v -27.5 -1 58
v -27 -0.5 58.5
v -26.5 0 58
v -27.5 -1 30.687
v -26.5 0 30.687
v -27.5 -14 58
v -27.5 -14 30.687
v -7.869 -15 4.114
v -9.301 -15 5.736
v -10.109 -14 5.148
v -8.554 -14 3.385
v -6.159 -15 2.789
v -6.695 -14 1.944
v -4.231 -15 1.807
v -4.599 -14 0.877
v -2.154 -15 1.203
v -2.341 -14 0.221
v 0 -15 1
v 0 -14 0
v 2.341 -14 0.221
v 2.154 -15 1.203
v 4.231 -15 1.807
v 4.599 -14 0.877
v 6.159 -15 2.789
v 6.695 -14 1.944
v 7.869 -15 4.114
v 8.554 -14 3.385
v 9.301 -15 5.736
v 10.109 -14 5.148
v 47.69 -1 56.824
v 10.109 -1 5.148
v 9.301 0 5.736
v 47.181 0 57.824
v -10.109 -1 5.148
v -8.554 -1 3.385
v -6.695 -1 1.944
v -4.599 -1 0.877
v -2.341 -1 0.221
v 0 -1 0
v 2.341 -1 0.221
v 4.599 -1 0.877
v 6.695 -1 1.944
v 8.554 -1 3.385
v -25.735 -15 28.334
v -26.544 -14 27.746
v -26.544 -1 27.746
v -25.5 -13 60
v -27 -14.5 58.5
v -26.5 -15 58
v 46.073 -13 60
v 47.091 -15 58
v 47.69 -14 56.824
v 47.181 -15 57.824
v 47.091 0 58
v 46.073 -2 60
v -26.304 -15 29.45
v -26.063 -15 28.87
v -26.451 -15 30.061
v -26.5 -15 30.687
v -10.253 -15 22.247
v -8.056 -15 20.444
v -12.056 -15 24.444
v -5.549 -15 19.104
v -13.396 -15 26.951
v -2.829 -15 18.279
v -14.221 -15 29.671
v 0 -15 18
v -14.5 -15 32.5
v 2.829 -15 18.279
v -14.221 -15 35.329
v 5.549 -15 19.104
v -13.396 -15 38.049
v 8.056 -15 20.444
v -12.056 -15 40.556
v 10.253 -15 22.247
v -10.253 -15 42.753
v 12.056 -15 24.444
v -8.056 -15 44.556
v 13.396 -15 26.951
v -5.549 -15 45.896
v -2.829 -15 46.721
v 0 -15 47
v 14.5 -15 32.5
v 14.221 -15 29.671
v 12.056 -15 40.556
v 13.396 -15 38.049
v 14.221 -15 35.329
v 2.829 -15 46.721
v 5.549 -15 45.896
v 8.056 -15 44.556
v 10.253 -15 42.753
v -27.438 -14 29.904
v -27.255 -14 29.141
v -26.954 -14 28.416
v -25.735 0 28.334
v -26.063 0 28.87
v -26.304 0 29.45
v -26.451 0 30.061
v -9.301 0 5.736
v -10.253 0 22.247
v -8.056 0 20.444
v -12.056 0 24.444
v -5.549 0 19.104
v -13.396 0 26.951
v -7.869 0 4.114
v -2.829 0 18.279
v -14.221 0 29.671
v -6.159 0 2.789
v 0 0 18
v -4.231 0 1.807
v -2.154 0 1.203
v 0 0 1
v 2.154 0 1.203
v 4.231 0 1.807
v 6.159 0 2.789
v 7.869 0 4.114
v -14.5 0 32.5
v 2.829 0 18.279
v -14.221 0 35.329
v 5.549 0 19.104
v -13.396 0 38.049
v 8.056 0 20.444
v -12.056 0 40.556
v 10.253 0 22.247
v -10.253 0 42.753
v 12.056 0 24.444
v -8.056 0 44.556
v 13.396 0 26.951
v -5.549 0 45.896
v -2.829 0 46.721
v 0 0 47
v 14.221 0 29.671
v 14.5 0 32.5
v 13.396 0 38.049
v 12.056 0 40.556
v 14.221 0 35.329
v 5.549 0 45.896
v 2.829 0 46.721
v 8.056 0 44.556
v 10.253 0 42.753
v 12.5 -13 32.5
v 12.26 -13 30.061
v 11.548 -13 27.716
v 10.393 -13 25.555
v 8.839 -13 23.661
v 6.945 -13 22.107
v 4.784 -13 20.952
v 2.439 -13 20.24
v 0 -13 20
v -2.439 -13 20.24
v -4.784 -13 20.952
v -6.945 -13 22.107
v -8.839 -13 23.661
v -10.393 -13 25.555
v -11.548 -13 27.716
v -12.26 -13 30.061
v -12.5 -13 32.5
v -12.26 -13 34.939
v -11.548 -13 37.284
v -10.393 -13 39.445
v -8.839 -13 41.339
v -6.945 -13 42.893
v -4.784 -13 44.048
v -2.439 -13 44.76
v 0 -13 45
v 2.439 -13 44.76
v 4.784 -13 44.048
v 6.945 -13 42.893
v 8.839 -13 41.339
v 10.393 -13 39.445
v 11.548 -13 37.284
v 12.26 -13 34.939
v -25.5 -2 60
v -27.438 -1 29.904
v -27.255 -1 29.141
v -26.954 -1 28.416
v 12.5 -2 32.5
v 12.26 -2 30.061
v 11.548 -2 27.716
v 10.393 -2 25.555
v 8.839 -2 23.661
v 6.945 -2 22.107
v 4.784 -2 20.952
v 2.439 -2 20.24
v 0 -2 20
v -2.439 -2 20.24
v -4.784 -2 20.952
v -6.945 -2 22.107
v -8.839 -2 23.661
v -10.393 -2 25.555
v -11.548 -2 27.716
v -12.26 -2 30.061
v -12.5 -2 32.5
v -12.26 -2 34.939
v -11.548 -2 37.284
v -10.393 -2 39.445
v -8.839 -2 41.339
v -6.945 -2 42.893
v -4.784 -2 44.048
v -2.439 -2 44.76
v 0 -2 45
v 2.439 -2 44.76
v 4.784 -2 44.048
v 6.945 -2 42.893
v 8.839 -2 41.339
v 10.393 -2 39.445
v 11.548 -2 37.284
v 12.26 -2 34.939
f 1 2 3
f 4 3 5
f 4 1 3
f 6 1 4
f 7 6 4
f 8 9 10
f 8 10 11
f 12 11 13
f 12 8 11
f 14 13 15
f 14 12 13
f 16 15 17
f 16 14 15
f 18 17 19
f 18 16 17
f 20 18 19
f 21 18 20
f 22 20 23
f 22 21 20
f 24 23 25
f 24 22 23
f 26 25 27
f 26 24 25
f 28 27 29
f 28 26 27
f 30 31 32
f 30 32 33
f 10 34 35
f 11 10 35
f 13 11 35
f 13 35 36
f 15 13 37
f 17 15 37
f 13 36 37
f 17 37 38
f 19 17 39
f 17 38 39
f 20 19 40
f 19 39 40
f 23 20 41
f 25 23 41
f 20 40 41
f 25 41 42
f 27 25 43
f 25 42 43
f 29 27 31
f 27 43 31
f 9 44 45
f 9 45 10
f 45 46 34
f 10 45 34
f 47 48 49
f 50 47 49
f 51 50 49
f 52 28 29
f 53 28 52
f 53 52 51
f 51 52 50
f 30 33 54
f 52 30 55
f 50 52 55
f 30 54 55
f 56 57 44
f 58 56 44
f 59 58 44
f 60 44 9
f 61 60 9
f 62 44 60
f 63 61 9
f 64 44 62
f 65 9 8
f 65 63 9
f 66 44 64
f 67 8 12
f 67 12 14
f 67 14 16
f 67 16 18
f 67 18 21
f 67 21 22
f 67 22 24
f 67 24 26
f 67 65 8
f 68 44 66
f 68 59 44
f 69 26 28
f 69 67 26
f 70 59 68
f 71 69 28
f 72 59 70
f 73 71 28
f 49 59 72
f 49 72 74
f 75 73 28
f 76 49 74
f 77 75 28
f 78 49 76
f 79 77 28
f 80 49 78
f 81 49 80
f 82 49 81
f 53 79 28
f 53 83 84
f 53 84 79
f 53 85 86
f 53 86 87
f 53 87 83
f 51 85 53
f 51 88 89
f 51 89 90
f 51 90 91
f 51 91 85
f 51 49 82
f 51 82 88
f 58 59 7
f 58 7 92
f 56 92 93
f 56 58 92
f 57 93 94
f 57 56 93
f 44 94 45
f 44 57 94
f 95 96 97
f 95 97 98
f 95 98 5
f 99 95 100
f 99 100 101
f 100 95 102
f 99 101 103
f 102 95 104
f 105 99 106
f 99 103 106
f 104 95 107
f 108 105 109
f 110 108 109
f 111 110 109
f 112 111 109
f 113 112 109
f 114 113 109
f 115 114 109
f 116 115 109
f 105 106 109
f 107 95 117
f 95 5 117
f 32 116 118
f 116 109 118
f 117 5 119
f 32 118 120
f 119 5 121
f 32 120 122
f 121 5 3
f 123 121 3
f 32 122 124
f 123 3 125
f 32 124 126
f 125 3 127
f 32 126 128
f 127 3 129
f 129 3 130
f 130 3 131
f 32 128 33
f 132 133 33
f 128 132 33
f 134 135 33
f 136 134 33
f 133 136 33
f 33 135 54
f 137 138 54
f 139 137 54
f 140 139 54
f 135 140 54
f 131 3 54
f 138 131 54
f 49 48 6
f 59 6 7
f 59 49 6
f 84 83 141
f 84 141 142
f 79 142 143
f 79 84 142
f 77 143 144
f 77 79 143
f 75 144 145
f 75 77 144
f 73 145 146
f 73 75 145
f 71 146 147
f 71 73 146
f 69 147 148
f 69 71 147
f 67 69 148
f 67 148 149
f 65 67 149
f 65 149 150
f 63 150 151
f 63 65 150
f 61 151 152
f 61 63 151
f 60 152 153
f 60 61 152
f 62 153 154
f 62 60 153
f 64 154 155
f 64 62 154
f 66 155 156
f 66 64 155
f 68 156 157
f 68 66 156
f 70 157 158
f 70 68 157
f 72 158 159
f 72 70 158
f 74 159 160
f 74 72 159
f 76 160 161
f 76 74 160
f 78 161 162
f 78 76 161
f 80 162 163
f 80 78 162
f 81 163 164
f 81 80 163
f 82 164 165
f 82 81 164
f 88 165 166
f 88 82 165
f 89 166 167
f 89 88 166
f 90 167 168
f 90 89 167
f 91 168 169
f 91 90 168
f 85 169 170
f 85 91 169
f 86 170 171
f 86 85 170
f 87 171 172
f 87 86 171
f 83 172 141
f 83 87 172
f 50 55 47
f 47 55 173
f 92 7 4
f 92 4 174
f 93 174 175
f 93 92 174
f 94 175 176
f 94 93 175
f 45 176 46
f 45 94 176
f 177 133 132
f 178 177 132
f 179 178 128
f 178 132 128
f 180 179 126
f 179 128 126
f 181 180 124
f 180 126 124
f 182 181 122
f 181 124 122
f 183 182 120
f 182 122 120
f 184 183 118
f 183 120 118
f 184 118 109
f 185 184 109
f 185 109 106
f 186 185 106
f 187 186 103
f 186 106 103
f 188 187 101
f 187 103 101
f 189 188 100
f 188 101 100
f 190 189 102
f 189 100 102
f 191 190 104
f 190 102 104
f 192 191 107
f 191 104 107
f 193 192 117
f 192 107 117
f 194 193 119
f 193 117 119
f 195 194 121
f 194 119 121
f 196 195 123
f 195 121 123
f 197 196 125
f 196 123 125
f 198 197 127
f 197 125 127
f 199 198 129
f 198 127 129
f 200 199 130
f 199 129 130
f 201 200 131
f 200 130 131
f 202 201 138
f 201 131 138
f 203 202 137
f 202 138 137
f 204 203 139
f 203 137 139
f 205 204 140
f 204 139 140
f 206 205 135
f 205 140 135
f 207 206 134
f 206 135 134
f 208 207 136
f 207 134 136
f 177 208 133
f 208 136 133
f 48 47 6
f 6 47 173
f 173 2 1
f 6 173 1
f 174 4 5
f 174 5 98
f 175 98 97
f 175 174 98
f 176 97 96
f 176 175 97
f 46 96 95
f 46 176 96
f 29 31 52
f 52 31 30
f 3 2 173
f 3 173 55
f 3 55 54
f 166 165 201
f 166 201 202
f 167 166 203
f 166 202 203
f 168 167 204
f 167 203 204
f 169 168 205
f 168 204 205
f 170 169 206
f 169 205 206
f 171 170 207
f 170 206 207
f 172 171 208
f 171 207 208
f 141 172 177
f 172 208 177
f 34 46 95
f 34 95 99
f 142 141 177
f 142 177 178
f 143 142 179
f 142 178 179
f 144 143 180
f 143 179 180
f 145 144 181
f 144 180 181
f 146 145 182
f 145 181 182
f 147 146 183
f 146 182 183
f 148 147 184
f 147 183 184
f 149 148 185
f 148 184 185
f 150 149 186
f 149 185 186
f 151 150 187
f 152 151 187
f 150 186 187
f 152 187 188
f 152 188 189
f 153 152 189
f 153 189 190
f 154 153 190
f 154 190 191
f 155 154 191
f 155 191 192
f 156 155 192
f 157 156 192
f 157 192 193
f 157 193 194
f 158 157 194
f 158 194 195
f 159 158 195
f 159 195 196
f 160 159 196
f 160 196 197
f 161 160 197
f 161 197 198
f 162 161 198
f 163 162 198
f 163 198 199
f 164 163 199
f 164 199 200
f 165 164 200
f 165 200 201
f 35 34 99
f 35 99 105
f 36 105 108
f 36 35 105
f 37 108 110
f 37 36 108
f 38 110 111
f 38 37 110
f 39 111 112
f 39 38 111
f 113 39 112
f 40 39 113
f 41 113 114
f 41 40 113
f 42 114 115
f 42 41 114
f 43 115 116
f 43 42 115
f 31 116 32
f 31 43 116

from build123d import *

# Parameters (mm, degrees)
F1_DEPTH    = 15
F2_T1_DEPTH = 34.8219363514
F2_T3_DEPTH = 25.2867319519
F2_T5_DEPTH = 87.7867319519
F3_R        = 5
F4_SIZE     = 1


# Not quite as in the source:
# - a fillet or chamfer that OpenCascade refuses, or shapes differently, is made with other operations: its cross-section is extruded or revolved along the edge and cut away or added


with BuildPart() as f1:
    # F0 (on Front) → F1 (new body)
    with BuildSketch(Plane.XZ):
        with BuildLine():
            Line((50, 60), (0, 60))
            Line((0, 60), (-27.5, 60))
            Line((-27.5, 60), (-27.5, 29.0612040202))
            Line((-27.5, 29.0612040202), (-10.1093475479, 5.1480552127))
            ThreePointArc((-10.1093475479, 5.1480552127), (0, 0), (10.1093475479, 5.1480552127))
            Line((10.1093475479, 5.1480552127), (50, 60))
        make_face()
        with BuildLine():
            ThreePointArc((12.5, 32.5), (-8.8388347648, 23.6611652352), (0, 45))
            ThreePointArc((0, 45), (8.8388347648, 41.3388347648), (12.5, 32.5))
        make_face(mode=Mode.SUBTRACT)
    extrude(amount=F1_DEPTH)

    # F2: chamfer of 2 on 7 edges, made by hand

    # F2_s2 → F2_t1 (cut)
    with BuildSketch(Plane.XZ.offset(-9.9109681757)):
        Polygon((47.69005228, 56.823688834), (46.0725566723, 60), (50, 60), align=None)
    extrude(amount=F2_T1_DEPTH, mode=Mode.SUBTRACT)

    # F2_s4 → F2_t3 (cut)
    with BuildSketch(Plane.XZ.offset(-5.1433659759)):
        Polygon((-25.5, 60), (-27.5, 58), (-27.5, 60), align=None)
    extrude(amount=F2_T3_DEPTH, mode=Mode.SUBTRACT)

    # F2_s6 → F2_t5 (cut)
    with BuildSketch(Plane.YZ.offset(-32.6433659759)):
        Polygon((-2, 60), (0, 58), (0, 60), align=None)
        Polygon((-13, 60), (-15, 58), (-15, 60), align=None)
    extrude(amount=F2_T5_DEPTH, mode=Mode.SUBTRACT)

    # F2_s7 → F2_t8 (revolve, cut)
    with BuildSketch(Plane.XY.offset(32.5)):
        Polygon((12.5, -2), (14.5, 0), (12.5, 0), align=None)
    revolve(axis=Axis((0, 0, 32.5), (0, 1, 0)), mode=Mode.SUBTRACT)

    # F2_s9 → F2_t10 (revolve, cut)
    with BuildSketch(Plane.XY.offset(32.5)):
        Polygon((12.5, -13), (14.5, -15), (12.5, -15), align=None)
    revolve(axis=Axis((0, -15, 32.5), (0, 1, 0)), mode=Mode.SUBTRACT)

    # F3
    f3_edges = [f1.edges().sort_by_distance(p)[0] for p in [
        (-27.5, -7.5, 29.061204),
    ]]
    fillet(f3_edges, radius=F3_R)

    # F4
    f4_edges = [f1.edges().sort_by_distance(p)[0] for p in [
        (28.8997, -15, 30.985872),
        (28.8997, 0, 30.985872),
        (-27.5, 0, 44.343534),
        (-27.254929, 0, 29.140895),
        (-18.326543, 0, 16.447173),
        (0, 0, 0),
        (-27.5, -15, 44.343534),
        (-27.254929, -15, 29.140895),
        (-18.326543, -15, 16.447173),
        (0, -15, 0),
    ]]
    chamfer(f4_edges, length=F4_SIZE)


solid = f1.part
